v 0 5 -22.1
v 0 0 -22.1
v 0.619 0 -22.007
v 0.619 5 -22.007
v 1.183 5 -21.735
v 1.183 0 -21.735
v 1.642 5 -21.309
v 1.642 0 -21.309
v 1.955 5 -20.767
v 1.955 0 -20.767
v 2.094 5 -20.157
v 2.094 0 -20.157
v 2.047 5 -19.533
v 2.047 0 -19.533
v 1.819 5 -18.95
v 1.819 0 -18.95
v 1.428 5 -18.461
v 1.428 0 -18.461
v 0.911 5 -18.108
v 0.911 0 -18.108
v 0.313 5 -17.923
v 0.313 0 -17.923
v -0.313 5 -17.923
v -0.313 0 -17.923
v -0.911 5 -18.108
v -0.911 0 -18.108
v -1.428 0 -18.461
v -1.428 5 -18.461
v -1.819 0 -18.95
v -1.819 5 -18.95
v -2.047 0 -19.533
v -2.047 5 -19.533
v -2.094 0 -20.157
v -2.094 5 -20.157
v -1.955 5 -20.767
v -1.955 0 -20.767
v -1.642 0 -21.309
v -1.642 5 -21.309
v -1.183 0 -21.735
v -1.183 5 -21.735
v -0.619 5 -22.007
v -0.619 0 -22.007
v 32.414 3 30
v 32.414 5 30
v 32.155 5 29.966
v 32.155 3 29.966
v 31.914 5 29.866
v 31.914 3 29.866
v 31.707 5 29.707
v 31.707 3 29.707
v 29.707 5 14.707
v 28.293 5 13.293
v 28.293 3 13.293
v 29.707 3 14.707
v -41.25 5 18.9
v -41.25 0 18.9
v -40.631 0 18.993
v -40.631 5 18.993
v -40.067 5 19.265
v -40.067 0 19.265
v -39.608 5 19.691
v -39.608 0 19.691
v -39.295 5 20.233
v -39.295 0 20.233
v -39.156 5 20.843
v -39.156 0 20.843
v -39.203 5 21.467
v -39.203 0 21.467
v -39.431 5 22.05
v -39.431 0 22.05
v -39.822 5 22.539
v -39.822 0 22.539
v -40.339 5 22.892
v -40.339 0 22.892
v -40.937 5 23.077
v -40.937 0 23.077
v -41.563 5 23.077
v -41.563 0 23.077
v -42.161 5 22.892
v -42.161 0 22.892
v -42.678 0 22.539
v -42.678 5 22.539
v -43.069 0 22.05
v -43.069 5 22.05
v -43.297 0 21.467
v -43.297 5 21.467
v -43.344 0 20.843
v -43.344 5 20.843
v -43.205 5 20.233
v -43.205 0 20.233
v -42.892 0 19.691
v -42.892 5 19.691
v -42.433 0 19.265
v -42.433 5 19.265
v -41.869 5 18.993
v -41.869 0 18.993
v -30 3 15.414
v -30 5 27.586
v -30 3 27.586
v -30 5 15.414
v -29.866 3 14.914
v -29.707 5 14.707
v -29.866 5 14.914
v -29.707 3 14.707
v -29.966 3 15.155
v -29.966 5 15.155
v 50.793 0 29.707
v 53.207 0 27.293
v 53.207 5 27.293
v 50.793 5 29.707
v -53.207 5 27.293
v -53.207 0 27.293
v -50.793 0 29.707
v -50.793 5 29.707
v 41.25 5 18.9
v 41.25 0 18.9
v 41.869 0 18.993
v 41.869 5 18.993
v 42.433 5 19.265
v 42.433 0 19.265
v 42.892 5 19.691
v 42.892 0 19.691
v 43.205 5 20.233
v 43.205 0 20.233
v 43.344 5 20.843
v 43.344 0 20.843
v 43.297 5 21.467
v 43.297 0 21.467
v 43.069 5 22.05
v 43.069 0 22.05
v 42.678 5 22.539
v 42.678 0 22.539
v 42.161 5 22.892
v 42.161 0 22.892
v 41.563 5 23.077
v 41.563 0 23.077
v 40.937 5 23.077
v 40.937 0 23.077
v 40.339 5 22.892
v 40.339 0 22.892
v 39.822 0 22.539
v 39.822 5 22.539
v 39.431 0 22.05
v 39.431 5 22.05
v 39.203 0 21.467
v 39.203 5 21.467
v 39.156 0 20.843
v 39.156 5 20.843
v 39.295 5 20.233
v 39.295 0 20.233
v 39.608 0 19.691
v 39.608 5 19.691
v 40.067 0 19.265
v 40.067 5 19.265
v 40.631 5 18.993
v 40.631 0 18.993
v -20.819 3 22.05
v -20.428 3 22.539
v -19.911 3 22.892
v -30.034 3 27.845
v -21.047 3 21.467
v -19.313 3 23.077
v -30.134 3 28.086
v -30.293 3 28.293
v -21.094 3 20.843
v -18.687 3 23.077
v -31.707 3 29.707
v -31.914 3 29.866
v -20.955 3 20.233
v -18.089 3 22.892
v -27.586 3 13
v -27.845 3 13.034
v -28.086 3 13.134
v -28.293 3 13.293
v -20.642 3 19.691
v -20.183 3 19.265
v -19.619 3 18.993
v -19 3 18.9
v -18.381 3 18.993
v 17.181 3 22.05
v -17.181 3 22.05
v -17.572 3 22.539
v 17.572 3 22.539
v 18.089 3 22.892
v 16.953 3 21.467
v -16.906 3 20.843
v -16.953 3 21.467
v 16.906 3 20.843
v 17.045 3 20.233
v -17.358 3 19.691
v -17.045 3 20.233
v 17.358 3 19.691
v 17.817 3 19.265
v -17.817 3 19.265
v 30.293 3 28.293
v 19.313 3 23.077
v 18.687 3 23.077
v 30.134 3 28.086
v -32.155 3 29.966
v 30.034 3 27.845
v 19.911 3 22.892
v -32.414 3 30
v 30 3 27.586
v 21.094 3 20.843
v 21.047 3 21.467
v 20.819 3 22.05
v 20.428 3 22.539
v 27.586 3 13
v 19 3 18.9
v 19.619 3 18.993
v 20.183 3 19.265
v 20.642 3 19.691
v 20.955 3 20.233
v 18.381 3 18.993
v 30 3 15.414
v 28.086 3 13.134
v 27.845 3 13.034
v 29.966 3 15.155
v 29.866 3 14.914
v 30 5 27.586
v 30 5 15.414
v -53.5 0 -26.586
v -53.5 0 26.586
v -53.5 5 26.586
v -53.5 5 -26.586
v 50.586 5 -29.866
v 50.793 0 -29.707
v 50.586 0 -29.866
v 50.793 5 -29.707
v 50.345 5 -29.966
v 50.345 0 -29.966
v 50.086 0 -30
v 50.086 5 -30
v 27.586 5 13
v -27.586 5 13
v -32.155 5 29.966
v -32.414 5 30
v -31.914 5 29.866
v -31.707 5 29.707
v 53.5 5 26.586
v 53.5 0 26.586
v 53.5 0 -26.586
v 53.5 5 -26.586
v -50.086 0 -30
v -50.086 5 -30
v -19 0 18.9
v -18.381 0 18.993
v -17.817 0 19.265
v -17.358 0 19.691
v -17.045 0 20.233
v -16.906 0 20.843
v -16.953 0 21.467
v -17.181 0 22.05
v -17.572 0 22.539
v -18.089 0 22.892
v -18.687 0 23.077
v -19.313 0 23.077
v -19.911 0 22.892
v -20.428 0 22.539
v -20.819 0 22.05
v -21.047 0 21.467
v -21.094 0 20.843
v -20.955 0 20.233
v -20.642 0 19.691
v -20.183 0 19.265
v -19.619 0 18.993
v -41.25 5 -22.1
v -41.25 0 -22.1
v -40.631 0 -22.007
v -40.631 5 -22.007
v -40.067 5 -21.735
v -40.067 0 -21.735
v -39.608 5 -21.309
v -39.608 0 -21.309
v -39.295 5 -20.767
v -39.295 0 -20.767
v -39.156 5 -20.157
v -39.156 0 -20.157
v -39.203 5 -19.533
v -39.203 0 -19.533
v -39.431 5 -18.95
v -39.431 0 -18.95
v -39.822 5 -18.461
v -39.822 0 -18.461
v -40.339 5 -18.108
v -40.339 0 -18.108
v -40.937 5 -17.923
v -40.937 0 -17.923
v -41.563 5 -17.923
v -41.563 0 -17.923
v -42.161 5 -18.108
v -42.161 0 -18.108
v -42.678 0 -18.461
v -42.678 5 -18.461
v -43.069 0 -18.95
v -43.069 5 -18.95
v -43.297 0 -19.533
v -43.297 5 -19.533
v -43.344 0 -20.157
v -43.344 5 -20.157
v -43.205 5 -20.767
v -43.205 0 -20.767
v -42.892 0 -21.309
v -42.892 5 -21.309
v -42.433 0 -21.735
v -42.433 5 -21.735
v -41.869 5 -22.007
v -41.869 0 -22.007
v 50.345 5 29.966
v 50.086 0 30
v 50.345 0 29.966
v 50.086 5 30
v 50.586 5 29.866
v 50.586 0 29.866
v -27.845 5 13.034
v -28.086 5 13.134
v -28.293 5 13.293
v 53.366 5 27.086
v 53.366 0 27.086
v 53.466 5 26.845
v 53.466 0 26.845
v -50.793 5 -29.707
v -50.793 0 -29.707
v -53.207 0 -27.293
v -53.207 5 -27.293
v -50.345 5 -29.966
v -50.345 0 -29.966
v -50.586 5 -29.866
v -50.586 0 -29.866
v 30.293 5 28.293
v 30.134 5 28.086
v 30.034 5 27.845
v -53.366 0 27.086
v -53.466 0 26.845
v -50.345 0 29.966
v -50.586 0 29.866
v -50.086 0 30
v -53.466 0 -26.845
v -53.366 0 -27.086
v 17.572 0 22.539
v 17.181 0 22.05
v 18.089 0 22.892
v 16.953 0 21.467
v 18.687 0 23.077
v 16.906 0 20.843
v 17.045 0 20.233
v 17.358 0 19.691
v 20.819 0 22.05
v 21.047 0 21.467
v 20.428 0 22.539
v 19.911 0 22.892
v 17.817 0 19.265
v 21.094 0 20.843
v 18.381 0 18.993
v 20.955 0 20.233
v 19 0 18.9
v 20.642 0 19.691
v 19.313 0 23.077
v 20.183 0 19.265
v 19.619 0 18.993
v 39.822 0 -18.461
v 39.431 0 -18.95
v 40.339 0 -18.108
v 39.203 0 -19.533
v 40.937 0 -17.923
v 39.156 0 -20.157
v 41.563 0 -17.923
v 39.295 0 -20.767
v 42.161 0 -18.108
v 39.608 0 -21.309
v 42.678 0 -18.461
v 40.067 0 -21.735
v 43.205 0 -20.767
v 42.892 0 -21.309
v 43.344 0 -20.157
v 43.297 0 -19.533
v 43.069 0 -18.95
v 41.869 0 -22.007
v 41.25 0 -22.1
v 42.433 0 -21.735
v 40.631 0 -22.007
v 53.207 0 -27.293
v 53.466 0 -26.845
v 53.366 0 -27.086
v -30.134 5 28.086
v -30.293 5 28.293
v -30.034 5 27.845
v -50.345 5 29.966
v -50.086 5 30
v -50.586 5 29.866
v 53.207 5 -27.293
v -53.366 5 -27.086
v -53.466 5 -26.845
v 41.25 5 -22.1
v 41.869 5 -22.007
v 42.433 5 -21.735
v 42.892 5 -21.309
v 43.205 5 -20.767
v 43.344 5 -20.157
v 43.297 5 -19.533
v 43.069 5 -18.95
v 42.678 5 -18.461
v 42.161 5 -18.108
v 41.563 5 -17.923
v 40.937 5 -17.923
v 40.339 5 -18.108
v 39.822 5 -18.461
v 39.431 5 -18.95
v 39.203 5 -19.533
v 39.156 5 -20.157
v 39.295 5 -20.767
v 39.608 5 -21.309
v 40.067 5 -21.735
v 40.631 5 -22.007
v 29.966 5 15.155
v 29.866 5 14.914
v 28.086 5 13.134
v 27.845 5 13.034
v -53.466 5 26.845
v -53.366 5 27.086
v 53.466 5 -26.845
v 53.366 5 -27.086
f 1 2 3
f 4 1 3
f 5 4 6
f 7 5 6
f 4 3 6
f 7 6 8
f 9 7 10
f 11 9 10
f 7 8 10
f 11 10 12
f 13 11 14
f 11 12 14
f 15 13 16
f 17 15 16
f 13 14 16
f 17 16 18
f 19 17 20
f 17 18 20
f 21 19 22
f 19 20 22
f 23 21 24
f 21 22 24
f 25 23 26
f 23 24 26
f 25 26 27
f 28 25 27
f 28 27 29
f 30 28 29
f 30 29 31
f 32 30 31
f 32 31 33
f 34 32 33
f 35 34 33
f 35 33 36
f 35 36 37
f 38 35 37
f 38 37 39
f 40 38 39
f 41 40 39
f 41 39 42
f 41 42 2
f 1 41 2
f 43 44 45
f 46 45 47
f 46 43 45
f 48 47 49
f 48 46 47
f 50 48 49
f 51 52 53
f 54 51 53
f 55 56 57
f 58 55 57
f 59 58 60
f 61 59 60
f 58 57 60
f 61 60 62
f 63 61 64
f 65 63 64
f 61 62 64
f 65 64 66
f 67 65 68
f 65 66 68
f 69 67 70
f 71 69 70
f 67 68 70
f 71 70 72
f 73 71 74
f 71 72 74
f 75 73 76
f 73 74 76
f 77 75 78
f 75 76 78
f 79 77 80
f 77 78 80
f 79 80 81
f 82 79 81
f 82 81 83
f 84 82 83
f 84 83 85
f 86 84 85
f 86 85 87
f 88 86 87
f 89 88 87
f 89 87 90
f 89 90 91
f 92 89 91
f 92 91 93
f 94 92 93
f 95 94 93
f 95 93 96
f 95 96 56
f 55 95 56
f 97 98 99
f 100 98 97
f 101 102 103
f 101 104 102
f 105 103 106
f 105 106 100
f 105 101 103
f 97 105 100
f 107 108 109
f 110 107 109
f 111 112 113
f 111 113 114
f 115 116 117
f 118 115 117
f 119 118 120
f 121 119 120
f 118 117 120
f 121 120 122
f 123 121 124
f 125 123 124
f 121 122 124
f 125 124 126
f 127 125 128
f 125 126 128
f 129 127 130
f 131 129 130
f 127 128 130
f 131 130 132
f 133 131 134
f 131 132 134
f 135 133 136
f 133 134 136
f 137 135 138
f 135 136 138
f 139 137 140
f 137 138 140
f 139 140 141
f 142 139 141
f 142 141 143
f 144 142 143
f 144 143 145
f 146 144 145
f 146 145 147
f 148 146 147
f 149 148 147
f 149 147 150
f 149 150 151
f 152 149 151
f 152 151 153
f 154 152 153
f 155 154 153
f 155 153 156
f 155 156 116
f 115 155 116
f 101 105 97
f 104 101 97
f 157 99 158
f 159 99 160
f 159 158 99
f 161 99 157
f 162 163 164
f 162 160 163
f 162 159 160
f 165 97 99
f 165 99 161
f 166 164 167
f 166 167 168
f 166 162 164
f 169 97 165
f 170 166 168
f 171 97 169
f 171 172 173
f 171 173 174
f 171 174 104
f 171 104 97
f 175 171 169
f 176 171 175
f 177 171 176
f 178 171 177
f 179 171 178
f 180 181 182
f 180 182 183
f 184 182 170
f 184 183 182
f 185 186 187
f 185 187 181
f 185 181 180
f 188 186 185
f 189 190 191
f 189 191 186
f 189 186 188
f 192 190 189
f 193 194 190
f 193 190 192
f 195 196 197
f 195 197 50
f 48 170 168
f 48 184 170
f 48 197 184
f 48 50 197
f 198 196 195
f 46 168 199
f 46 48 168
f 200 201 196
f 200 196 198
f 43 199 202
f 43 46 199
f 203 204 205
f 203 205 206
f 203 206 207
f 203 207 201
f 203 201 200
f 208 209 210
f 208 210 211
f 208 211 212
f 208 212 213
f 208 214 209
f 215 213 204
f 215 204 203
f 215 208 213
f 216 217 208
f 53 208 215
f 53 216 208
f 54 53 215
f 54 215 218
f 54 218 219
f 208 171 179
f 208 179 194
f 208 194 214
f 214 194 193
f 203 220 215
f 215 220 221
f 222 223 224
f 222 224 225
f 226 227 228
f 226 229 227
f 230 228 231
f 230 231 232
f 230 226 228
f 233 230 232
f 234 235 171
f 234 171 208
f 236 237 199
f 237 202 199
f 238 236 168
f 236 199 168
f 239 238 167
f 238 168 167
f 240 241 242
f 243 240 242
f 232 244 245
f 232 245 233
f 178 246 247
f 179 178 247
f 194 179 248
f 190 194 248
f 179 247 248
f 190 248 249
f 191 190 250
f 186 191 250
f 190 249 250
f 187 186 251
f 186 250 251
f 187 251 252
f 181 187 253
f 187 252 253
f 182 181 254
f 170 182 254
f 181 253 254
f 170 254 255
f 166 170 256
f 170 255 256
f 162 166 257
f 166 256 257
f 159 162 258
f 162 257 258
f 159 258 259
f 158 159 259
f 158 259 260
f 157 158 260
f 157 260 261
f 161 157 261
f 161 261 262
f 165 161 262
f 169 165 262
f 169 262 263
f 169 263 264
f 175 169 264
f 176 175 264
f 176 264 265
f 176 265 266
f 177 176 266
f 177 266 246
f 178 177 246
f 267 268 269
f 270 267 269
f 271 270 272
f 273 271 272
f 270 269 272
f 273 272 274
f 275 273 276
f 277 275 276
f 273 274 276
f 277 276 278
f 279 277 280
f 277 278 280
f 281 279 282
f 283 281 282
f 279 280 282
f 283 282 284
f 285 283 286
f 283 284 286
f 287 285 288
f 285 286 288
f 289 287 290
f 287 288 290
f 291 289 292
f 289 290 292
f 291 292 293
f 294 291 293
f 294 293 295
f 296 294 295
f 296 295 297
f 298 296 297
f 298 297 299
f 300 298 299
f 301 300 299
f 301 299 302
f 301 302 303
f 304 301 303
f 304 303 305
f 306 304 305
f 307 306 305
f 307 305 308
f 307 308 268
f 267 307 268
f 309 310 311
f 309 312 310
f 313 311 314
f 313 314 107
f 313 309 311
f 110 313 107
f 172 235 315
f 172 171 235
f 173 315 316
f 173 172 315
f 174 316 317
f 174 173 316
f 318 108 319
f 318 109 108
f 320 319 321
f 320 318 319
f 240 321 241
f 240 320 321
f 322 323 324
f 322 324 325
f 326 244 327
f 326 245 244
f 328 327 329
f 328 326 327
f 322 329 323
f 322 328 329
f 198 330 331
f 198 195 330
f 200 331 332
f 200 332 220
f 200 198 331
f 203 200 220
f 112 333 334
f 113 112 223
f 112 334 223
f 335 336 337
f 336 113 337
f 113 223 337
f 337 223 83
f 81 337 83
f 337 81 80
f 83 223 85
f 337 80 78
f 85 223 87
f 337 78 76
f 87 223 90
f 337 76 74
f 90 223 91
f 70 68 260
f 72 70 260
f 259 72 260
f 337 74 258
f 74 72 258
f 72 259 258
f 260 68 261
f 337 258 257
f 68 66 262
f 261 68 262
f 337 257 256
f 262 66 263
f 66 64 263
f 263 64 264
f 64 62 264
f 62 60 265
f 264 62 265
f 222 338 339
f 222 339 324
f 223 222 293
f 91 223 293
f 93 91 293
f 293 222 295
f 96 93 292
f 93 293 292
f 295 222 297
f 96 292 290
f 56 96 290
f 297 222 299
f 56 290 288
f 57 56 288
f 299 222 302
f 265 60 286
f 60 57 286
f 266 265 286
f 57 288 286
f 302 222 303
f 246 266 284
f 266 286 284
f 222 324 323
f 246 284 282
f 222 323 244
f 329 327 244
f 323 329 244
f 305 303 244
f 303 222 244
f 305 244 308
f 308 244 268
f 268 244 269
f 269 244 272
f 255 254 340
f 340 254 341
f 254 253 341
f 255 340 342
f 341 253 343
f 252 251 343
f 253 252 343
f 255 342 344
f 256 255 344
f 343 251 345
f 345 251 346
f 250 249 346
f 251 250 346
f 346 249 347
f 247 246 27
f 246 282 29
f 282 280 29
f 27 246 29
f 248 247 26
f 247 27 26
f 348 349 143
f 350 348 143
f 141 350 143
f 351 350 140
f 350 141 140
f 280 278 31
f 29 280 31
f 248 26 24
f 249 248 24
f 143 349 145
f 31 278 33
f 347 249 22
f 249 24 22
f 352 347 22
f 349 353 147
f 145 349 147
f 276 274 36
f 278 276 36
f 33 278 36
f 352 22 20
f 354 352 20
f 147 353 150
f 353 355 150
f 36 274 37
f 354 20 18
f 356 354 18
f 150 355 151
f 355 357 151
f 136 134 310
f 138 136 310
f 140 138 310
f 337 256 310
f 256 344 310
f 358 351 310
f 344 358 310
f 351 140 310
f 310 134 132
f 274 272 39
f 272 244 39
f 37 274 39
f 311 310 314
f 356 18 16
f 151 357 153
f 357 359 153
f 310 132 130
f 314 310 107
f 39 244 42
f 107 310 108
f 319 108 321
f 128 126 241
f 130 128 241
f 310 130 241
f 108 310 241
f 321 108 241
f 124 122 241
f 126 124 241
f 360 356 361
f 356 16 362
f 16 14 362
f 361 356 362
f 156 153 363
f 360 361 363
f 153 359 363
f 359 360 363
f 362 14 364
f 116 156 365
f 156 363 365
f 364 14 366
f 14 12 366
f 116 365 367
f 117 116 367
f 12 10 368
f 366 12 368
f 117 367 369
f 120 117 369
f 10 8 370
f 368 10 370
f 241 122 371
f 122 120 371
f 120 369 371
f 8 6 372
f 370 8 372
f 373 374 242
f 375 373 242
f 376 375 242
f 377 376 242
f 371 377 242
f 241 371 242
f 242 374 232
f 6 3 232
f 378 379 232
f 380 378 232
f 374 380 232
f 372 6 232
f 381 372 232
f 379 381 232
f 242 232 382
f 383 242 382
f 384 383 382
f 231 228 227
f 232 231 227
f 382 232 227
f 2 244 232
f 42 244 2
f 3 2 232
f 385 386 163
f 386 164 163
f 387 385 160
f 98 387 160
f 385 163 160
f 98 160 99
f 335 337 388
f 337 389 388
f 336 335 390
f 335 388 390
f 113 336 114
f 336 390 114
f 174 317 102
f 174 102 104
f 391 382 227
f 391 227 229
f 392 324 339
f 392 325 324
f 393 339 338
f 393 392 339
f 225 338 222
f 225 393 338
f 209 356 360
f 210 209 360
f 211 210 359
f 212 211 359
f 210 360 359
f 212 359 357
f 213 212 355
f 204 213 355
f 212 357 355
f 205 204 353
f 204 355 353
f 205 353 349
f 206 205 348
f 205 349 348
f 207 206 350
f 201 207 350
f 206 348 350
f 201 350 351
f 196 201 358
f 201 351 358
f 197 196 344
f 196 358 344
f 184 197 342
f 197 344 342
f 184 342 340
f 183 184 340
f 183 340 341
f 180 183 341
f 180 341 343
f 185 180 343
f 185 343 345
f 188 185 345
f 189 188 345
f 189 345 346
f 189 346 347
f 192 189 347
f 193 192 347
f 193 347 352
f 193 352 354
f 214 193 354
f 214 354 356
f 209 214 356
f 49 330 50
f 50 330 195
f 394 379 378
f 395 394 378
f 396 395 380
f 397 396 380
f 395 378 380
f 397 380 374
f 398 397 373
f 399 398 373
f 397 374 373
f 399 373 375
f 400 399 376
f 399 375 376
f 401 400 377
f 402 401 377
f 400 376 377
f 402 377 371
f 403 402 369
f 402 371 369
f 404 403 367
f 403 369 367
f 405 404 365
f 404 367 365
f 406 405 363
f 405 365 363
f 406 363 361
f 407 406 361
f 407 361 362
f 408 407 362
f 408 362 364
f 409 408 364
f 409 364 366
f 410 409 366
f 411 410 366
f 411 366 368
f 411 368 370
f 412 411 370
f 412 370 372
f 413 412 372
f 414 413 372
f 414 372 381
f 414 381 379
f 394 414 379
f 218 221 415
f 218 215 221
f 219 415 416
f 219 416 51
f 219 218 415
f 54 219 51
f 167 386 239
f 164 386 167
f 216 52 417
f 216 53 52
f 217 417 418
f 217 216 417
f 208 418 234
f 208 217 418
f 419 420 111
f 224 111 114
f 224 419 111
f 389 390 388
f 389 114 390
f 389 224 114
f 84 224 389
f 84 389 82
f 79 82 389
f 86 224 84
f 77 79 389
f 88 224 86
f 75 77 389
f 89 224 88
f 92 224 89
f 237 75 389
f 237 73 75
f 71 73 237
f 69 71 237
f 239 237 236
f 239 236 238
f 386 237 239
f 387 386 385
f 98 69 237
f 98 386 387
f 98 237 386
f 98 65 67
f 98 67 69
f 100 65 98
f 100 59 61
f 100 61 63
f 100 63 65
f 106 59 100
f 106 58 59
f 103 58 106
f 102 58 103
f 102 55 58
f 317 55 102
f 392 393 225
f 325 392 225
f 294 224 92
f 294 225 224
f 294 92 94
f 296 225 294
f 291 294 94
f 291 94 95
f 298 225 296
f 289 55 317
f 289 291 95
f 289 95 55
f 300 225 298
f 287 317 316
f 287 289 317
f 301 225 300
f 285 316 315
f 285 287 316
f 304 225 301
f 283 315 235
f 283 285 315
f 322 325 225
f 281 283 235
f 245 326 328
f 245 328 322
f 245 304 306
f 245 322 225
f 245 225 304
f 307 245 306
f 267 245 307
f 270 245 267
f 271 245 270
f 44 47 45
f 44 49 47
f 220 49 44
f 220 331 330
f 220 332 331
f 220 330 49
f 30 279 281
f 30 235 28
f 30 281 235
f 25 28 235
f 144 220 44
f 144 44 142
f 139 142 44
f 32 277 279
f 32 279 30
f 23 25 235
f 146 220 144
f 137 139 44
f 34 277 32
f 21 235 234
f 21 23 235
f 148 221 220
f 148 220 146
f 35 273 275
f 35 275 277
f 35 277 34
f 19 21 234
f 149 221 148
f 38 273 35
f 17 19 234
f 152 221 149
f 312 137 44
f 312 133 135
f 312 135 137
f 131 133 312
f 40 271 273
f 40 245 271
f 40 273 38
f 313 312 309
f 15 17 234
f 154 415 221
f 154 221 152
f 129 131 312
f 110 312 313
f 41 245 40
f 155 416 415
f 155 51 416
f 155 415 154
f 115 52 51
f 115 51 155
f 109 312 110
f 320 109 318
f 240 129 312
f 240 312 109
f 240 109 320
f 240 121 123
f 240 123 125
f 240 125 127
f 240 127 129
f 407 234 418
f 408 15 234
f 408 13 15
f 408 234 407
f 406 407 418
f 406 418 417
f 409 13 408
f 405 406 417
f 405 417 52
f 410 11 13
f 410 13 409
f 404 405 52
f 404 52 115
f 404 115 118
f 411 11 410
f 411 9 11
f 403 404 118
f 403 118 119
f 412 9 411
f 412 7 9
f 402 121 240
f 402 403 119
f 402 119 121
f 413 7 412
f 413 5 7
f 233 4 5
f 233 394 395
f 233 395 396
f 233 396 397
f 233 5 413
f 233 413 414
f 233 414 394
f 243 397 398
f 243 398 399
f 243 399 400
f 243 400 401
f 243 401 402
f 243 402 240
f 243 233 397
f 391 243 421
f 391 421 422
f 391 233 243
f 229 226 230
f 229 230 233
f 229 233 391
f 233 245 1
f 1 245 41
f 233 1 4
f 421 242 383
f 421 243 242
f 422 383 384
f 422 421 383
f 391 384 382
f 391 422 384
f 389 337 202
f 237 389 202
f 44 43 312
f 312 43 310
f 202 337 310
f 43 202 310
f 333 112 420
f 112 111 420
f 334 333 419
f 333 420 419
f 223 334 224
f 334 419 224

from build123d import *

# Parameters (mm, degrees)
SKETCH1_W                   = 107
SKETCH1_H                   = 60
BOSS_EXTRUDE1_DEPTH         = 5
SKETCH2_W                   = 60
SKETCH2_H                   = 17
CUT_EXTRUDE1_DEPTH          = 2
CHAMFER1_SIZE               = 2
CHAMFER2_SIZE               = 3
FILLET1_R                   = 1
TAP_DRILL_FOR_M5_TAP1_D     = 4.2
TAP_DRILL_FOR_M5_TAP1_DEPTH = 46
TAP_DRILL_FOR_M5_TAP1_TIP   = 1.2618073
TAP_DRILL_FOR_M5_TAP2_D     = 4.2
TAP_DRILL_FOR_M5_TAP2_DEPTH = 46
TAP_DRILL_FOR_M5_TAP2_TIP   = 1.2618073


with BuildPart() as part:
    # Sketch1 → Boss-Extrude1 (new body)
    with BuildSketch(Plane(origin=(0, 0, 0), x_dir=(1, 0, 0), z_dir=(0, 1, 0))):
        Rectangle(SKETCH1_W, SKETCH1_H)
    extrude(amount=BOSS_EXTRUDE1_DEPTH)

    # Sketch2 → Cut-Extrude1 (cut)
    with BuildSketch(Plane(origin=(0, 5, 0), x_dir=(1, 0, 0), z_dir=(0, 1, 0))):
        with Locations((0, -21.5)):
            Rectangle(SKETCH2_W, SKETCH2_H)
    extrude(amount=-CUT_EXTRUDE1_DEPTH, mode=Mode.SUBTRACT)

    # Chamfer1
    chamfer1_edges = [part.edges().sort_by_distance(p)[0] for p in [
        (30, 4, 13),
        (30, 4, 30),
        (-30, 4, 30),
        (-30, 4, 13),
    ]]
    chamfer(chamfer1_edges, length=CHAMFER1_SIZE)

    # Chamfer2
    chamfer2_edges = [part.edges().sort_by_distance(p)[0] for p in [
        (53.5, 2.5, 30),
        (-53.5, 2.5, 30),
        (-53.5, 2.5, -30),
        (53.5, 2.5, -30),
    ]]
    chamfer(chamfer2_edges, length=CHAMFER2_SIZE)

    # Fillet1
    fillet1_edges = [part.edges().sort_by_distance(p)[0] for p in [
        (30, 4, 15),
        (30, 4, 28),
        (-32, 4, 30),
        (32, 4, 30),
        (-28, 4, 13),
        (28, 4, 13),
        (-30, 4, 15),
        (-30, 4, 28),
        (-53.5, 2.5, 27),
        (-53.5, 2.5, -27),
        (50.5, 2.5, -30),
        (-50.5, 2.5, -30),
        (50.5, 2.5, 30),
        (-50.5, 2.5, 30),
        (53.5, 2.5, 27),
        (53.5, 2.5, -27),
    ]]
    fillet(fillet1_edges, radius=FILLET1_R)

    # Tap Drill for M5 Tap1
    with Locations(Plane(origin=(-41.25, 5, 21), x_dir=(0, 0, 1), z_dir=(0, 1, 0))):
        with Locations((0, 0), (-41, 0), (-41, 41.25), (-41, 82.5), (0, 82.5)):
            Hole(TAP_DRILL_FOR_M5_TAP1_D / 2, depth=TAP_DRILL_FOR_M5_TAP1_DEPTH)
            with Locations((0, 0, -(TAP_DRILL_FOR_M5_TAP1_DEPTH + TAP_DRILL_FOR_M5_TAP1_TIP / 2))):  # 118° drill point
                Cone(0, TAP_DRILL_FOR_M5_TAP1_D / 2, TAP_DRILL_FOR_M5_TAP1_TIP, mode=Mode.SUBTRACT)

    # Tap Drill for M5 Tap2
    with Locations(Plane(origin=(-19, 3, 21), x_dir=(0, 0, 1), z_dir=(0, 1, 0))):
        with Locations((0, 0), (0, 38)):
            Hole(TAP_DRILL_FOR_M5_TAP2_D / 2, depth=TAP_DRILL_FOR_M5_TAP2_DEPTH)
            with Locations((0, 0, -(TAP_DRILL_FOR_M5_TAP2_DEPTH + TAP_DRILL_FOR_M5_TAP2_TIP / 2))):  # 118° drill point
                Cone(0, TAP_DRILL_FOR_M5_TAP2_D / 2, TAP_DRILL_FOR_M5_TAP2_TIP, mode=Mode.SUBTRACT)


solid = part.part
